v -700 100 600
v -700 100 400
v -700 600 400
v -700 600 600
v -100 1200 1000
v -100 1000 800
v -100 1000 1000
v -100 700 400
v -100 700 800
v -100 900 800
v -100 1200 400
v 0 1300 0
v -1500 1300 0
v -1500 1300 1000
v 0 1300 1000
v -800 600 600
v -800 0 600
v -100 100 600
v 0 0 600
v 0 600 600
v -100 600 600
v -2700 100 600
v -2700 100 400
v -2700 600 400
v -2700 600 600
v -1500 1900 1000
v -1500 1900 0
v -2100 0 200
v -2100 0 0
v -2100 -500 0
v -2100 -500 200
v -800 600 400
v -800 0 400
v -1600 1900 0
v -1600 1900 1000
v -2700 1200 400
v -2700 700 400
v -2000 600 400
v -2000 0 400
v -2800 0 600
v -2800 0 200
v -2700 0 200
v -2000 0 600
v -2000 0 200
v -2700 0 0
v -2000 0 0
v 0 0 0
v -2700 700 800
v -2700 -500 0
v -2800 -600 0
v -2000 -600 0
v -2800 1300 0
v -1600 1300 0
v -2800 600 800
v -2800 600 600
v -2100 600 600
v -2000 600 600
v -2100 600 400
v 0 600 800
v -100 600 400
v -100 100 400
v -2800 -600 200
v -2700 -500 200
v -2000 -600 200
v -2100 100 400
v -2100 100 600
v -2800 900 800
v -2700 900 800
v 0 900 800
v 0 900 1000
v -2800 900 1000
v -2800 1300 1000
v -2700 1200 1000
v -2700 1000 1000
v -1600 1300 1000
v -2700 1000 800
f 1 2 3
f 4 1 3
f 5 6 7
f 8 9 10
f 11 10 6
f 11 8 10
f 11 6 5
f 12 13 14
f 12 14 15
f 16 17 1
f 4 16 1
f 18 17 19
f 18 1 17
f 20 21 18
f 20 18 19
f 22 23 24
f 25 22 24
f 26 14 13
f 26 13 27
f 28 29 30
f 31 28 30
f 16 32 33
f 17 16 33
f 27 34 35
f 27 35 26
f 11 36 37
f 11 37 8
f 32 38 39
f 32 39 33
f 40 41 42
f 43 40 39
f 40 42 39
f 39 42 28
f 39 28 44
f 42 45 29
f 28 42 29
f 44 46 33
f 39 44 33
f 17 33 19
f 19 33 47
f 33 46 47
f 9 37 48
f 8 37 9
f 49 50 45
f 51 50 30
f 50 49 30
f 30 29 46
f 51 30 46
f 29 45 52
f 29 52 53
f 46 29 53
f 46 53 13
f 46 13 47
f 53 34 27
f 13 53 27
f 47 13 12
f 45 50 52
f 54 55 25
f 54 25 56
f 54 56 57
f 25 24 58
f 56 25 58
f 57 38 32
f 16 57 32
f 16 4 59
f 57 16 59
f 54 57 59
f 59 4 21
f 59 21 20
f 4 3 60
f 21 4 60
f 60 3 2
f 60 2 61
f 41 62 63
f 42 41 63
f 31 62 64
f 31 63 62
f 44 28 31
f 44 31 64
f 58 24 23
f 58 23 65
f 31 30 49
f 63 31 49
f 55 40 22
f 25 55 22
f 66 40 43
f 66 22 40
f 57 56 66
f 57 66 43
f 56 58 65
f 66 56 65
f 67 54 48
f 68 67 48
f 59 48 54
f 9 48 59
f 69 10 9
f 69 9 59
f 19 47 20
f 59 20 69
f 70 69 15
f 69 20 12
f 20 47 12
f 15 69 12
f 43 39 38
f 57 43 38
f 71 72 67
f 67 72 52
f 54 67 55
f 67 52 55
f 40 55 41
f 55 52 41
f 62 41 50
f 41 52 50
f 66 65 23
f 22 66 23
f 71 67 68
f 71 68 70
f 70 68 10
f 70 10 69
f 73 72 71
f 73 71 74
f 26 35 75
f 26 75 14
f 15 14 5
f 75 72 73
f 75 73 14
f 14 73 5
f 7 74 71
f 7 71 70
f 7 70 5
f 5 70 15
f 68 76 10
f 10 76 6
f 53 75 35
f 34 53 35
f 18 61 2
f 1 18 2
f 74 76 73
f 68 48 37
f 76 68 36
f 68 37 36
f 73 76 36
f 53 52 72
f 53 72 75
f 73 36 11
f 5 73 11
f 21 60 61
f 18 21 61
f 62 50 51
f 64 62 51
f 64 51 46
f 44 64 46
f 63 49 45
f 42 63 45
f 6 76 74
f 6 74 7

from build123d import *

# Parameters (mm, degrees)
F0_W      = 2800
F0_H      = 1300
F1_DEPTH  = 400
F2_W      = 2800
F2_H      = 700
F2_W_2    = 2600
F2_H_2    = 500
F3_DEPTH  = 400
F4_W      = 2800
F4_H      = 400
F4_W_2    = 2600
F4_H_2    = 200
F5_DEPTH  = 200
F6_W      = 100
F6_H      = 600
F7_DEPTH  = 1000
F9_DEPTH  = 200
F11_DEPTH = 200


with BuildPart() as f1:
    # F0 (on Top) → F1 (new body)
    with BuildSketch(Plane.XY):
        with Locations((-1400, 650)):
            Rectangle(F0_W, F0_H)
    extrude(amount=F1_DEPTH)

    # F2 (on face) → F3 (join)
    with BuildSketch(Plane.XY.offset(400)):
        with Locations((-1400, 950)):
            Rectangle(F2_W, F2_H)
        with Locations((-1400, 950)):
            Rectangle(F2_W_2, F2_H_2, mode=Mode.SUBTRACT)
    extrude(amount=F3_DEPTH)

    # F4 (on face) → F5 (join)
    with BuildSketch(Plane.XY.offset(800)):
        with Locations((-1400, 1100)):
            Rectangle(F4_W, F4_H)
        with Locations((-1400, 1100)):
            Rectangle(F4_W_2, F4_H_2, mode=Mode.SUBTRACT)
    extrude(amount=F5_DEPTH)

    # F6 (on Top) → F7 (join)
    with BuildSketch(Plane.XY):
        with Locations((-1550, 1600)):
            Rectangle(F6_W, F6_H)
    extrude(amount=F7_DEPTH)

    # F8 (on face) → F9 (join)
    with BuildSketch(Plane.XY.offset(400)):
        Polygon((0, 0), (0, 600), (-100, 600), (-100, 100), (-700, 100), (-700, 600), (-800, 600), (-800, 0), align=None)
        Polygon((-2800, 600), (-2800, 0), (-2000, 0), (-2000, 600), (-2100, 600), (-2100, 100), (-2700, 100), (-2700, 600), align=None)
    extrude(amount=F9_DEPTH)

    # F10 (on Top) → F11 (join)
    with BuildSketch(Plane.XY):
        Polygon((-2700, 0), (-2800, 0), (-2800, -600), (-2000, -600), (-2000, 0), (-2100, 0), (-2100, -500), (-2700, -500), align=None)
    extrude(amount=F11_DEPTH)


solid = f1.part
